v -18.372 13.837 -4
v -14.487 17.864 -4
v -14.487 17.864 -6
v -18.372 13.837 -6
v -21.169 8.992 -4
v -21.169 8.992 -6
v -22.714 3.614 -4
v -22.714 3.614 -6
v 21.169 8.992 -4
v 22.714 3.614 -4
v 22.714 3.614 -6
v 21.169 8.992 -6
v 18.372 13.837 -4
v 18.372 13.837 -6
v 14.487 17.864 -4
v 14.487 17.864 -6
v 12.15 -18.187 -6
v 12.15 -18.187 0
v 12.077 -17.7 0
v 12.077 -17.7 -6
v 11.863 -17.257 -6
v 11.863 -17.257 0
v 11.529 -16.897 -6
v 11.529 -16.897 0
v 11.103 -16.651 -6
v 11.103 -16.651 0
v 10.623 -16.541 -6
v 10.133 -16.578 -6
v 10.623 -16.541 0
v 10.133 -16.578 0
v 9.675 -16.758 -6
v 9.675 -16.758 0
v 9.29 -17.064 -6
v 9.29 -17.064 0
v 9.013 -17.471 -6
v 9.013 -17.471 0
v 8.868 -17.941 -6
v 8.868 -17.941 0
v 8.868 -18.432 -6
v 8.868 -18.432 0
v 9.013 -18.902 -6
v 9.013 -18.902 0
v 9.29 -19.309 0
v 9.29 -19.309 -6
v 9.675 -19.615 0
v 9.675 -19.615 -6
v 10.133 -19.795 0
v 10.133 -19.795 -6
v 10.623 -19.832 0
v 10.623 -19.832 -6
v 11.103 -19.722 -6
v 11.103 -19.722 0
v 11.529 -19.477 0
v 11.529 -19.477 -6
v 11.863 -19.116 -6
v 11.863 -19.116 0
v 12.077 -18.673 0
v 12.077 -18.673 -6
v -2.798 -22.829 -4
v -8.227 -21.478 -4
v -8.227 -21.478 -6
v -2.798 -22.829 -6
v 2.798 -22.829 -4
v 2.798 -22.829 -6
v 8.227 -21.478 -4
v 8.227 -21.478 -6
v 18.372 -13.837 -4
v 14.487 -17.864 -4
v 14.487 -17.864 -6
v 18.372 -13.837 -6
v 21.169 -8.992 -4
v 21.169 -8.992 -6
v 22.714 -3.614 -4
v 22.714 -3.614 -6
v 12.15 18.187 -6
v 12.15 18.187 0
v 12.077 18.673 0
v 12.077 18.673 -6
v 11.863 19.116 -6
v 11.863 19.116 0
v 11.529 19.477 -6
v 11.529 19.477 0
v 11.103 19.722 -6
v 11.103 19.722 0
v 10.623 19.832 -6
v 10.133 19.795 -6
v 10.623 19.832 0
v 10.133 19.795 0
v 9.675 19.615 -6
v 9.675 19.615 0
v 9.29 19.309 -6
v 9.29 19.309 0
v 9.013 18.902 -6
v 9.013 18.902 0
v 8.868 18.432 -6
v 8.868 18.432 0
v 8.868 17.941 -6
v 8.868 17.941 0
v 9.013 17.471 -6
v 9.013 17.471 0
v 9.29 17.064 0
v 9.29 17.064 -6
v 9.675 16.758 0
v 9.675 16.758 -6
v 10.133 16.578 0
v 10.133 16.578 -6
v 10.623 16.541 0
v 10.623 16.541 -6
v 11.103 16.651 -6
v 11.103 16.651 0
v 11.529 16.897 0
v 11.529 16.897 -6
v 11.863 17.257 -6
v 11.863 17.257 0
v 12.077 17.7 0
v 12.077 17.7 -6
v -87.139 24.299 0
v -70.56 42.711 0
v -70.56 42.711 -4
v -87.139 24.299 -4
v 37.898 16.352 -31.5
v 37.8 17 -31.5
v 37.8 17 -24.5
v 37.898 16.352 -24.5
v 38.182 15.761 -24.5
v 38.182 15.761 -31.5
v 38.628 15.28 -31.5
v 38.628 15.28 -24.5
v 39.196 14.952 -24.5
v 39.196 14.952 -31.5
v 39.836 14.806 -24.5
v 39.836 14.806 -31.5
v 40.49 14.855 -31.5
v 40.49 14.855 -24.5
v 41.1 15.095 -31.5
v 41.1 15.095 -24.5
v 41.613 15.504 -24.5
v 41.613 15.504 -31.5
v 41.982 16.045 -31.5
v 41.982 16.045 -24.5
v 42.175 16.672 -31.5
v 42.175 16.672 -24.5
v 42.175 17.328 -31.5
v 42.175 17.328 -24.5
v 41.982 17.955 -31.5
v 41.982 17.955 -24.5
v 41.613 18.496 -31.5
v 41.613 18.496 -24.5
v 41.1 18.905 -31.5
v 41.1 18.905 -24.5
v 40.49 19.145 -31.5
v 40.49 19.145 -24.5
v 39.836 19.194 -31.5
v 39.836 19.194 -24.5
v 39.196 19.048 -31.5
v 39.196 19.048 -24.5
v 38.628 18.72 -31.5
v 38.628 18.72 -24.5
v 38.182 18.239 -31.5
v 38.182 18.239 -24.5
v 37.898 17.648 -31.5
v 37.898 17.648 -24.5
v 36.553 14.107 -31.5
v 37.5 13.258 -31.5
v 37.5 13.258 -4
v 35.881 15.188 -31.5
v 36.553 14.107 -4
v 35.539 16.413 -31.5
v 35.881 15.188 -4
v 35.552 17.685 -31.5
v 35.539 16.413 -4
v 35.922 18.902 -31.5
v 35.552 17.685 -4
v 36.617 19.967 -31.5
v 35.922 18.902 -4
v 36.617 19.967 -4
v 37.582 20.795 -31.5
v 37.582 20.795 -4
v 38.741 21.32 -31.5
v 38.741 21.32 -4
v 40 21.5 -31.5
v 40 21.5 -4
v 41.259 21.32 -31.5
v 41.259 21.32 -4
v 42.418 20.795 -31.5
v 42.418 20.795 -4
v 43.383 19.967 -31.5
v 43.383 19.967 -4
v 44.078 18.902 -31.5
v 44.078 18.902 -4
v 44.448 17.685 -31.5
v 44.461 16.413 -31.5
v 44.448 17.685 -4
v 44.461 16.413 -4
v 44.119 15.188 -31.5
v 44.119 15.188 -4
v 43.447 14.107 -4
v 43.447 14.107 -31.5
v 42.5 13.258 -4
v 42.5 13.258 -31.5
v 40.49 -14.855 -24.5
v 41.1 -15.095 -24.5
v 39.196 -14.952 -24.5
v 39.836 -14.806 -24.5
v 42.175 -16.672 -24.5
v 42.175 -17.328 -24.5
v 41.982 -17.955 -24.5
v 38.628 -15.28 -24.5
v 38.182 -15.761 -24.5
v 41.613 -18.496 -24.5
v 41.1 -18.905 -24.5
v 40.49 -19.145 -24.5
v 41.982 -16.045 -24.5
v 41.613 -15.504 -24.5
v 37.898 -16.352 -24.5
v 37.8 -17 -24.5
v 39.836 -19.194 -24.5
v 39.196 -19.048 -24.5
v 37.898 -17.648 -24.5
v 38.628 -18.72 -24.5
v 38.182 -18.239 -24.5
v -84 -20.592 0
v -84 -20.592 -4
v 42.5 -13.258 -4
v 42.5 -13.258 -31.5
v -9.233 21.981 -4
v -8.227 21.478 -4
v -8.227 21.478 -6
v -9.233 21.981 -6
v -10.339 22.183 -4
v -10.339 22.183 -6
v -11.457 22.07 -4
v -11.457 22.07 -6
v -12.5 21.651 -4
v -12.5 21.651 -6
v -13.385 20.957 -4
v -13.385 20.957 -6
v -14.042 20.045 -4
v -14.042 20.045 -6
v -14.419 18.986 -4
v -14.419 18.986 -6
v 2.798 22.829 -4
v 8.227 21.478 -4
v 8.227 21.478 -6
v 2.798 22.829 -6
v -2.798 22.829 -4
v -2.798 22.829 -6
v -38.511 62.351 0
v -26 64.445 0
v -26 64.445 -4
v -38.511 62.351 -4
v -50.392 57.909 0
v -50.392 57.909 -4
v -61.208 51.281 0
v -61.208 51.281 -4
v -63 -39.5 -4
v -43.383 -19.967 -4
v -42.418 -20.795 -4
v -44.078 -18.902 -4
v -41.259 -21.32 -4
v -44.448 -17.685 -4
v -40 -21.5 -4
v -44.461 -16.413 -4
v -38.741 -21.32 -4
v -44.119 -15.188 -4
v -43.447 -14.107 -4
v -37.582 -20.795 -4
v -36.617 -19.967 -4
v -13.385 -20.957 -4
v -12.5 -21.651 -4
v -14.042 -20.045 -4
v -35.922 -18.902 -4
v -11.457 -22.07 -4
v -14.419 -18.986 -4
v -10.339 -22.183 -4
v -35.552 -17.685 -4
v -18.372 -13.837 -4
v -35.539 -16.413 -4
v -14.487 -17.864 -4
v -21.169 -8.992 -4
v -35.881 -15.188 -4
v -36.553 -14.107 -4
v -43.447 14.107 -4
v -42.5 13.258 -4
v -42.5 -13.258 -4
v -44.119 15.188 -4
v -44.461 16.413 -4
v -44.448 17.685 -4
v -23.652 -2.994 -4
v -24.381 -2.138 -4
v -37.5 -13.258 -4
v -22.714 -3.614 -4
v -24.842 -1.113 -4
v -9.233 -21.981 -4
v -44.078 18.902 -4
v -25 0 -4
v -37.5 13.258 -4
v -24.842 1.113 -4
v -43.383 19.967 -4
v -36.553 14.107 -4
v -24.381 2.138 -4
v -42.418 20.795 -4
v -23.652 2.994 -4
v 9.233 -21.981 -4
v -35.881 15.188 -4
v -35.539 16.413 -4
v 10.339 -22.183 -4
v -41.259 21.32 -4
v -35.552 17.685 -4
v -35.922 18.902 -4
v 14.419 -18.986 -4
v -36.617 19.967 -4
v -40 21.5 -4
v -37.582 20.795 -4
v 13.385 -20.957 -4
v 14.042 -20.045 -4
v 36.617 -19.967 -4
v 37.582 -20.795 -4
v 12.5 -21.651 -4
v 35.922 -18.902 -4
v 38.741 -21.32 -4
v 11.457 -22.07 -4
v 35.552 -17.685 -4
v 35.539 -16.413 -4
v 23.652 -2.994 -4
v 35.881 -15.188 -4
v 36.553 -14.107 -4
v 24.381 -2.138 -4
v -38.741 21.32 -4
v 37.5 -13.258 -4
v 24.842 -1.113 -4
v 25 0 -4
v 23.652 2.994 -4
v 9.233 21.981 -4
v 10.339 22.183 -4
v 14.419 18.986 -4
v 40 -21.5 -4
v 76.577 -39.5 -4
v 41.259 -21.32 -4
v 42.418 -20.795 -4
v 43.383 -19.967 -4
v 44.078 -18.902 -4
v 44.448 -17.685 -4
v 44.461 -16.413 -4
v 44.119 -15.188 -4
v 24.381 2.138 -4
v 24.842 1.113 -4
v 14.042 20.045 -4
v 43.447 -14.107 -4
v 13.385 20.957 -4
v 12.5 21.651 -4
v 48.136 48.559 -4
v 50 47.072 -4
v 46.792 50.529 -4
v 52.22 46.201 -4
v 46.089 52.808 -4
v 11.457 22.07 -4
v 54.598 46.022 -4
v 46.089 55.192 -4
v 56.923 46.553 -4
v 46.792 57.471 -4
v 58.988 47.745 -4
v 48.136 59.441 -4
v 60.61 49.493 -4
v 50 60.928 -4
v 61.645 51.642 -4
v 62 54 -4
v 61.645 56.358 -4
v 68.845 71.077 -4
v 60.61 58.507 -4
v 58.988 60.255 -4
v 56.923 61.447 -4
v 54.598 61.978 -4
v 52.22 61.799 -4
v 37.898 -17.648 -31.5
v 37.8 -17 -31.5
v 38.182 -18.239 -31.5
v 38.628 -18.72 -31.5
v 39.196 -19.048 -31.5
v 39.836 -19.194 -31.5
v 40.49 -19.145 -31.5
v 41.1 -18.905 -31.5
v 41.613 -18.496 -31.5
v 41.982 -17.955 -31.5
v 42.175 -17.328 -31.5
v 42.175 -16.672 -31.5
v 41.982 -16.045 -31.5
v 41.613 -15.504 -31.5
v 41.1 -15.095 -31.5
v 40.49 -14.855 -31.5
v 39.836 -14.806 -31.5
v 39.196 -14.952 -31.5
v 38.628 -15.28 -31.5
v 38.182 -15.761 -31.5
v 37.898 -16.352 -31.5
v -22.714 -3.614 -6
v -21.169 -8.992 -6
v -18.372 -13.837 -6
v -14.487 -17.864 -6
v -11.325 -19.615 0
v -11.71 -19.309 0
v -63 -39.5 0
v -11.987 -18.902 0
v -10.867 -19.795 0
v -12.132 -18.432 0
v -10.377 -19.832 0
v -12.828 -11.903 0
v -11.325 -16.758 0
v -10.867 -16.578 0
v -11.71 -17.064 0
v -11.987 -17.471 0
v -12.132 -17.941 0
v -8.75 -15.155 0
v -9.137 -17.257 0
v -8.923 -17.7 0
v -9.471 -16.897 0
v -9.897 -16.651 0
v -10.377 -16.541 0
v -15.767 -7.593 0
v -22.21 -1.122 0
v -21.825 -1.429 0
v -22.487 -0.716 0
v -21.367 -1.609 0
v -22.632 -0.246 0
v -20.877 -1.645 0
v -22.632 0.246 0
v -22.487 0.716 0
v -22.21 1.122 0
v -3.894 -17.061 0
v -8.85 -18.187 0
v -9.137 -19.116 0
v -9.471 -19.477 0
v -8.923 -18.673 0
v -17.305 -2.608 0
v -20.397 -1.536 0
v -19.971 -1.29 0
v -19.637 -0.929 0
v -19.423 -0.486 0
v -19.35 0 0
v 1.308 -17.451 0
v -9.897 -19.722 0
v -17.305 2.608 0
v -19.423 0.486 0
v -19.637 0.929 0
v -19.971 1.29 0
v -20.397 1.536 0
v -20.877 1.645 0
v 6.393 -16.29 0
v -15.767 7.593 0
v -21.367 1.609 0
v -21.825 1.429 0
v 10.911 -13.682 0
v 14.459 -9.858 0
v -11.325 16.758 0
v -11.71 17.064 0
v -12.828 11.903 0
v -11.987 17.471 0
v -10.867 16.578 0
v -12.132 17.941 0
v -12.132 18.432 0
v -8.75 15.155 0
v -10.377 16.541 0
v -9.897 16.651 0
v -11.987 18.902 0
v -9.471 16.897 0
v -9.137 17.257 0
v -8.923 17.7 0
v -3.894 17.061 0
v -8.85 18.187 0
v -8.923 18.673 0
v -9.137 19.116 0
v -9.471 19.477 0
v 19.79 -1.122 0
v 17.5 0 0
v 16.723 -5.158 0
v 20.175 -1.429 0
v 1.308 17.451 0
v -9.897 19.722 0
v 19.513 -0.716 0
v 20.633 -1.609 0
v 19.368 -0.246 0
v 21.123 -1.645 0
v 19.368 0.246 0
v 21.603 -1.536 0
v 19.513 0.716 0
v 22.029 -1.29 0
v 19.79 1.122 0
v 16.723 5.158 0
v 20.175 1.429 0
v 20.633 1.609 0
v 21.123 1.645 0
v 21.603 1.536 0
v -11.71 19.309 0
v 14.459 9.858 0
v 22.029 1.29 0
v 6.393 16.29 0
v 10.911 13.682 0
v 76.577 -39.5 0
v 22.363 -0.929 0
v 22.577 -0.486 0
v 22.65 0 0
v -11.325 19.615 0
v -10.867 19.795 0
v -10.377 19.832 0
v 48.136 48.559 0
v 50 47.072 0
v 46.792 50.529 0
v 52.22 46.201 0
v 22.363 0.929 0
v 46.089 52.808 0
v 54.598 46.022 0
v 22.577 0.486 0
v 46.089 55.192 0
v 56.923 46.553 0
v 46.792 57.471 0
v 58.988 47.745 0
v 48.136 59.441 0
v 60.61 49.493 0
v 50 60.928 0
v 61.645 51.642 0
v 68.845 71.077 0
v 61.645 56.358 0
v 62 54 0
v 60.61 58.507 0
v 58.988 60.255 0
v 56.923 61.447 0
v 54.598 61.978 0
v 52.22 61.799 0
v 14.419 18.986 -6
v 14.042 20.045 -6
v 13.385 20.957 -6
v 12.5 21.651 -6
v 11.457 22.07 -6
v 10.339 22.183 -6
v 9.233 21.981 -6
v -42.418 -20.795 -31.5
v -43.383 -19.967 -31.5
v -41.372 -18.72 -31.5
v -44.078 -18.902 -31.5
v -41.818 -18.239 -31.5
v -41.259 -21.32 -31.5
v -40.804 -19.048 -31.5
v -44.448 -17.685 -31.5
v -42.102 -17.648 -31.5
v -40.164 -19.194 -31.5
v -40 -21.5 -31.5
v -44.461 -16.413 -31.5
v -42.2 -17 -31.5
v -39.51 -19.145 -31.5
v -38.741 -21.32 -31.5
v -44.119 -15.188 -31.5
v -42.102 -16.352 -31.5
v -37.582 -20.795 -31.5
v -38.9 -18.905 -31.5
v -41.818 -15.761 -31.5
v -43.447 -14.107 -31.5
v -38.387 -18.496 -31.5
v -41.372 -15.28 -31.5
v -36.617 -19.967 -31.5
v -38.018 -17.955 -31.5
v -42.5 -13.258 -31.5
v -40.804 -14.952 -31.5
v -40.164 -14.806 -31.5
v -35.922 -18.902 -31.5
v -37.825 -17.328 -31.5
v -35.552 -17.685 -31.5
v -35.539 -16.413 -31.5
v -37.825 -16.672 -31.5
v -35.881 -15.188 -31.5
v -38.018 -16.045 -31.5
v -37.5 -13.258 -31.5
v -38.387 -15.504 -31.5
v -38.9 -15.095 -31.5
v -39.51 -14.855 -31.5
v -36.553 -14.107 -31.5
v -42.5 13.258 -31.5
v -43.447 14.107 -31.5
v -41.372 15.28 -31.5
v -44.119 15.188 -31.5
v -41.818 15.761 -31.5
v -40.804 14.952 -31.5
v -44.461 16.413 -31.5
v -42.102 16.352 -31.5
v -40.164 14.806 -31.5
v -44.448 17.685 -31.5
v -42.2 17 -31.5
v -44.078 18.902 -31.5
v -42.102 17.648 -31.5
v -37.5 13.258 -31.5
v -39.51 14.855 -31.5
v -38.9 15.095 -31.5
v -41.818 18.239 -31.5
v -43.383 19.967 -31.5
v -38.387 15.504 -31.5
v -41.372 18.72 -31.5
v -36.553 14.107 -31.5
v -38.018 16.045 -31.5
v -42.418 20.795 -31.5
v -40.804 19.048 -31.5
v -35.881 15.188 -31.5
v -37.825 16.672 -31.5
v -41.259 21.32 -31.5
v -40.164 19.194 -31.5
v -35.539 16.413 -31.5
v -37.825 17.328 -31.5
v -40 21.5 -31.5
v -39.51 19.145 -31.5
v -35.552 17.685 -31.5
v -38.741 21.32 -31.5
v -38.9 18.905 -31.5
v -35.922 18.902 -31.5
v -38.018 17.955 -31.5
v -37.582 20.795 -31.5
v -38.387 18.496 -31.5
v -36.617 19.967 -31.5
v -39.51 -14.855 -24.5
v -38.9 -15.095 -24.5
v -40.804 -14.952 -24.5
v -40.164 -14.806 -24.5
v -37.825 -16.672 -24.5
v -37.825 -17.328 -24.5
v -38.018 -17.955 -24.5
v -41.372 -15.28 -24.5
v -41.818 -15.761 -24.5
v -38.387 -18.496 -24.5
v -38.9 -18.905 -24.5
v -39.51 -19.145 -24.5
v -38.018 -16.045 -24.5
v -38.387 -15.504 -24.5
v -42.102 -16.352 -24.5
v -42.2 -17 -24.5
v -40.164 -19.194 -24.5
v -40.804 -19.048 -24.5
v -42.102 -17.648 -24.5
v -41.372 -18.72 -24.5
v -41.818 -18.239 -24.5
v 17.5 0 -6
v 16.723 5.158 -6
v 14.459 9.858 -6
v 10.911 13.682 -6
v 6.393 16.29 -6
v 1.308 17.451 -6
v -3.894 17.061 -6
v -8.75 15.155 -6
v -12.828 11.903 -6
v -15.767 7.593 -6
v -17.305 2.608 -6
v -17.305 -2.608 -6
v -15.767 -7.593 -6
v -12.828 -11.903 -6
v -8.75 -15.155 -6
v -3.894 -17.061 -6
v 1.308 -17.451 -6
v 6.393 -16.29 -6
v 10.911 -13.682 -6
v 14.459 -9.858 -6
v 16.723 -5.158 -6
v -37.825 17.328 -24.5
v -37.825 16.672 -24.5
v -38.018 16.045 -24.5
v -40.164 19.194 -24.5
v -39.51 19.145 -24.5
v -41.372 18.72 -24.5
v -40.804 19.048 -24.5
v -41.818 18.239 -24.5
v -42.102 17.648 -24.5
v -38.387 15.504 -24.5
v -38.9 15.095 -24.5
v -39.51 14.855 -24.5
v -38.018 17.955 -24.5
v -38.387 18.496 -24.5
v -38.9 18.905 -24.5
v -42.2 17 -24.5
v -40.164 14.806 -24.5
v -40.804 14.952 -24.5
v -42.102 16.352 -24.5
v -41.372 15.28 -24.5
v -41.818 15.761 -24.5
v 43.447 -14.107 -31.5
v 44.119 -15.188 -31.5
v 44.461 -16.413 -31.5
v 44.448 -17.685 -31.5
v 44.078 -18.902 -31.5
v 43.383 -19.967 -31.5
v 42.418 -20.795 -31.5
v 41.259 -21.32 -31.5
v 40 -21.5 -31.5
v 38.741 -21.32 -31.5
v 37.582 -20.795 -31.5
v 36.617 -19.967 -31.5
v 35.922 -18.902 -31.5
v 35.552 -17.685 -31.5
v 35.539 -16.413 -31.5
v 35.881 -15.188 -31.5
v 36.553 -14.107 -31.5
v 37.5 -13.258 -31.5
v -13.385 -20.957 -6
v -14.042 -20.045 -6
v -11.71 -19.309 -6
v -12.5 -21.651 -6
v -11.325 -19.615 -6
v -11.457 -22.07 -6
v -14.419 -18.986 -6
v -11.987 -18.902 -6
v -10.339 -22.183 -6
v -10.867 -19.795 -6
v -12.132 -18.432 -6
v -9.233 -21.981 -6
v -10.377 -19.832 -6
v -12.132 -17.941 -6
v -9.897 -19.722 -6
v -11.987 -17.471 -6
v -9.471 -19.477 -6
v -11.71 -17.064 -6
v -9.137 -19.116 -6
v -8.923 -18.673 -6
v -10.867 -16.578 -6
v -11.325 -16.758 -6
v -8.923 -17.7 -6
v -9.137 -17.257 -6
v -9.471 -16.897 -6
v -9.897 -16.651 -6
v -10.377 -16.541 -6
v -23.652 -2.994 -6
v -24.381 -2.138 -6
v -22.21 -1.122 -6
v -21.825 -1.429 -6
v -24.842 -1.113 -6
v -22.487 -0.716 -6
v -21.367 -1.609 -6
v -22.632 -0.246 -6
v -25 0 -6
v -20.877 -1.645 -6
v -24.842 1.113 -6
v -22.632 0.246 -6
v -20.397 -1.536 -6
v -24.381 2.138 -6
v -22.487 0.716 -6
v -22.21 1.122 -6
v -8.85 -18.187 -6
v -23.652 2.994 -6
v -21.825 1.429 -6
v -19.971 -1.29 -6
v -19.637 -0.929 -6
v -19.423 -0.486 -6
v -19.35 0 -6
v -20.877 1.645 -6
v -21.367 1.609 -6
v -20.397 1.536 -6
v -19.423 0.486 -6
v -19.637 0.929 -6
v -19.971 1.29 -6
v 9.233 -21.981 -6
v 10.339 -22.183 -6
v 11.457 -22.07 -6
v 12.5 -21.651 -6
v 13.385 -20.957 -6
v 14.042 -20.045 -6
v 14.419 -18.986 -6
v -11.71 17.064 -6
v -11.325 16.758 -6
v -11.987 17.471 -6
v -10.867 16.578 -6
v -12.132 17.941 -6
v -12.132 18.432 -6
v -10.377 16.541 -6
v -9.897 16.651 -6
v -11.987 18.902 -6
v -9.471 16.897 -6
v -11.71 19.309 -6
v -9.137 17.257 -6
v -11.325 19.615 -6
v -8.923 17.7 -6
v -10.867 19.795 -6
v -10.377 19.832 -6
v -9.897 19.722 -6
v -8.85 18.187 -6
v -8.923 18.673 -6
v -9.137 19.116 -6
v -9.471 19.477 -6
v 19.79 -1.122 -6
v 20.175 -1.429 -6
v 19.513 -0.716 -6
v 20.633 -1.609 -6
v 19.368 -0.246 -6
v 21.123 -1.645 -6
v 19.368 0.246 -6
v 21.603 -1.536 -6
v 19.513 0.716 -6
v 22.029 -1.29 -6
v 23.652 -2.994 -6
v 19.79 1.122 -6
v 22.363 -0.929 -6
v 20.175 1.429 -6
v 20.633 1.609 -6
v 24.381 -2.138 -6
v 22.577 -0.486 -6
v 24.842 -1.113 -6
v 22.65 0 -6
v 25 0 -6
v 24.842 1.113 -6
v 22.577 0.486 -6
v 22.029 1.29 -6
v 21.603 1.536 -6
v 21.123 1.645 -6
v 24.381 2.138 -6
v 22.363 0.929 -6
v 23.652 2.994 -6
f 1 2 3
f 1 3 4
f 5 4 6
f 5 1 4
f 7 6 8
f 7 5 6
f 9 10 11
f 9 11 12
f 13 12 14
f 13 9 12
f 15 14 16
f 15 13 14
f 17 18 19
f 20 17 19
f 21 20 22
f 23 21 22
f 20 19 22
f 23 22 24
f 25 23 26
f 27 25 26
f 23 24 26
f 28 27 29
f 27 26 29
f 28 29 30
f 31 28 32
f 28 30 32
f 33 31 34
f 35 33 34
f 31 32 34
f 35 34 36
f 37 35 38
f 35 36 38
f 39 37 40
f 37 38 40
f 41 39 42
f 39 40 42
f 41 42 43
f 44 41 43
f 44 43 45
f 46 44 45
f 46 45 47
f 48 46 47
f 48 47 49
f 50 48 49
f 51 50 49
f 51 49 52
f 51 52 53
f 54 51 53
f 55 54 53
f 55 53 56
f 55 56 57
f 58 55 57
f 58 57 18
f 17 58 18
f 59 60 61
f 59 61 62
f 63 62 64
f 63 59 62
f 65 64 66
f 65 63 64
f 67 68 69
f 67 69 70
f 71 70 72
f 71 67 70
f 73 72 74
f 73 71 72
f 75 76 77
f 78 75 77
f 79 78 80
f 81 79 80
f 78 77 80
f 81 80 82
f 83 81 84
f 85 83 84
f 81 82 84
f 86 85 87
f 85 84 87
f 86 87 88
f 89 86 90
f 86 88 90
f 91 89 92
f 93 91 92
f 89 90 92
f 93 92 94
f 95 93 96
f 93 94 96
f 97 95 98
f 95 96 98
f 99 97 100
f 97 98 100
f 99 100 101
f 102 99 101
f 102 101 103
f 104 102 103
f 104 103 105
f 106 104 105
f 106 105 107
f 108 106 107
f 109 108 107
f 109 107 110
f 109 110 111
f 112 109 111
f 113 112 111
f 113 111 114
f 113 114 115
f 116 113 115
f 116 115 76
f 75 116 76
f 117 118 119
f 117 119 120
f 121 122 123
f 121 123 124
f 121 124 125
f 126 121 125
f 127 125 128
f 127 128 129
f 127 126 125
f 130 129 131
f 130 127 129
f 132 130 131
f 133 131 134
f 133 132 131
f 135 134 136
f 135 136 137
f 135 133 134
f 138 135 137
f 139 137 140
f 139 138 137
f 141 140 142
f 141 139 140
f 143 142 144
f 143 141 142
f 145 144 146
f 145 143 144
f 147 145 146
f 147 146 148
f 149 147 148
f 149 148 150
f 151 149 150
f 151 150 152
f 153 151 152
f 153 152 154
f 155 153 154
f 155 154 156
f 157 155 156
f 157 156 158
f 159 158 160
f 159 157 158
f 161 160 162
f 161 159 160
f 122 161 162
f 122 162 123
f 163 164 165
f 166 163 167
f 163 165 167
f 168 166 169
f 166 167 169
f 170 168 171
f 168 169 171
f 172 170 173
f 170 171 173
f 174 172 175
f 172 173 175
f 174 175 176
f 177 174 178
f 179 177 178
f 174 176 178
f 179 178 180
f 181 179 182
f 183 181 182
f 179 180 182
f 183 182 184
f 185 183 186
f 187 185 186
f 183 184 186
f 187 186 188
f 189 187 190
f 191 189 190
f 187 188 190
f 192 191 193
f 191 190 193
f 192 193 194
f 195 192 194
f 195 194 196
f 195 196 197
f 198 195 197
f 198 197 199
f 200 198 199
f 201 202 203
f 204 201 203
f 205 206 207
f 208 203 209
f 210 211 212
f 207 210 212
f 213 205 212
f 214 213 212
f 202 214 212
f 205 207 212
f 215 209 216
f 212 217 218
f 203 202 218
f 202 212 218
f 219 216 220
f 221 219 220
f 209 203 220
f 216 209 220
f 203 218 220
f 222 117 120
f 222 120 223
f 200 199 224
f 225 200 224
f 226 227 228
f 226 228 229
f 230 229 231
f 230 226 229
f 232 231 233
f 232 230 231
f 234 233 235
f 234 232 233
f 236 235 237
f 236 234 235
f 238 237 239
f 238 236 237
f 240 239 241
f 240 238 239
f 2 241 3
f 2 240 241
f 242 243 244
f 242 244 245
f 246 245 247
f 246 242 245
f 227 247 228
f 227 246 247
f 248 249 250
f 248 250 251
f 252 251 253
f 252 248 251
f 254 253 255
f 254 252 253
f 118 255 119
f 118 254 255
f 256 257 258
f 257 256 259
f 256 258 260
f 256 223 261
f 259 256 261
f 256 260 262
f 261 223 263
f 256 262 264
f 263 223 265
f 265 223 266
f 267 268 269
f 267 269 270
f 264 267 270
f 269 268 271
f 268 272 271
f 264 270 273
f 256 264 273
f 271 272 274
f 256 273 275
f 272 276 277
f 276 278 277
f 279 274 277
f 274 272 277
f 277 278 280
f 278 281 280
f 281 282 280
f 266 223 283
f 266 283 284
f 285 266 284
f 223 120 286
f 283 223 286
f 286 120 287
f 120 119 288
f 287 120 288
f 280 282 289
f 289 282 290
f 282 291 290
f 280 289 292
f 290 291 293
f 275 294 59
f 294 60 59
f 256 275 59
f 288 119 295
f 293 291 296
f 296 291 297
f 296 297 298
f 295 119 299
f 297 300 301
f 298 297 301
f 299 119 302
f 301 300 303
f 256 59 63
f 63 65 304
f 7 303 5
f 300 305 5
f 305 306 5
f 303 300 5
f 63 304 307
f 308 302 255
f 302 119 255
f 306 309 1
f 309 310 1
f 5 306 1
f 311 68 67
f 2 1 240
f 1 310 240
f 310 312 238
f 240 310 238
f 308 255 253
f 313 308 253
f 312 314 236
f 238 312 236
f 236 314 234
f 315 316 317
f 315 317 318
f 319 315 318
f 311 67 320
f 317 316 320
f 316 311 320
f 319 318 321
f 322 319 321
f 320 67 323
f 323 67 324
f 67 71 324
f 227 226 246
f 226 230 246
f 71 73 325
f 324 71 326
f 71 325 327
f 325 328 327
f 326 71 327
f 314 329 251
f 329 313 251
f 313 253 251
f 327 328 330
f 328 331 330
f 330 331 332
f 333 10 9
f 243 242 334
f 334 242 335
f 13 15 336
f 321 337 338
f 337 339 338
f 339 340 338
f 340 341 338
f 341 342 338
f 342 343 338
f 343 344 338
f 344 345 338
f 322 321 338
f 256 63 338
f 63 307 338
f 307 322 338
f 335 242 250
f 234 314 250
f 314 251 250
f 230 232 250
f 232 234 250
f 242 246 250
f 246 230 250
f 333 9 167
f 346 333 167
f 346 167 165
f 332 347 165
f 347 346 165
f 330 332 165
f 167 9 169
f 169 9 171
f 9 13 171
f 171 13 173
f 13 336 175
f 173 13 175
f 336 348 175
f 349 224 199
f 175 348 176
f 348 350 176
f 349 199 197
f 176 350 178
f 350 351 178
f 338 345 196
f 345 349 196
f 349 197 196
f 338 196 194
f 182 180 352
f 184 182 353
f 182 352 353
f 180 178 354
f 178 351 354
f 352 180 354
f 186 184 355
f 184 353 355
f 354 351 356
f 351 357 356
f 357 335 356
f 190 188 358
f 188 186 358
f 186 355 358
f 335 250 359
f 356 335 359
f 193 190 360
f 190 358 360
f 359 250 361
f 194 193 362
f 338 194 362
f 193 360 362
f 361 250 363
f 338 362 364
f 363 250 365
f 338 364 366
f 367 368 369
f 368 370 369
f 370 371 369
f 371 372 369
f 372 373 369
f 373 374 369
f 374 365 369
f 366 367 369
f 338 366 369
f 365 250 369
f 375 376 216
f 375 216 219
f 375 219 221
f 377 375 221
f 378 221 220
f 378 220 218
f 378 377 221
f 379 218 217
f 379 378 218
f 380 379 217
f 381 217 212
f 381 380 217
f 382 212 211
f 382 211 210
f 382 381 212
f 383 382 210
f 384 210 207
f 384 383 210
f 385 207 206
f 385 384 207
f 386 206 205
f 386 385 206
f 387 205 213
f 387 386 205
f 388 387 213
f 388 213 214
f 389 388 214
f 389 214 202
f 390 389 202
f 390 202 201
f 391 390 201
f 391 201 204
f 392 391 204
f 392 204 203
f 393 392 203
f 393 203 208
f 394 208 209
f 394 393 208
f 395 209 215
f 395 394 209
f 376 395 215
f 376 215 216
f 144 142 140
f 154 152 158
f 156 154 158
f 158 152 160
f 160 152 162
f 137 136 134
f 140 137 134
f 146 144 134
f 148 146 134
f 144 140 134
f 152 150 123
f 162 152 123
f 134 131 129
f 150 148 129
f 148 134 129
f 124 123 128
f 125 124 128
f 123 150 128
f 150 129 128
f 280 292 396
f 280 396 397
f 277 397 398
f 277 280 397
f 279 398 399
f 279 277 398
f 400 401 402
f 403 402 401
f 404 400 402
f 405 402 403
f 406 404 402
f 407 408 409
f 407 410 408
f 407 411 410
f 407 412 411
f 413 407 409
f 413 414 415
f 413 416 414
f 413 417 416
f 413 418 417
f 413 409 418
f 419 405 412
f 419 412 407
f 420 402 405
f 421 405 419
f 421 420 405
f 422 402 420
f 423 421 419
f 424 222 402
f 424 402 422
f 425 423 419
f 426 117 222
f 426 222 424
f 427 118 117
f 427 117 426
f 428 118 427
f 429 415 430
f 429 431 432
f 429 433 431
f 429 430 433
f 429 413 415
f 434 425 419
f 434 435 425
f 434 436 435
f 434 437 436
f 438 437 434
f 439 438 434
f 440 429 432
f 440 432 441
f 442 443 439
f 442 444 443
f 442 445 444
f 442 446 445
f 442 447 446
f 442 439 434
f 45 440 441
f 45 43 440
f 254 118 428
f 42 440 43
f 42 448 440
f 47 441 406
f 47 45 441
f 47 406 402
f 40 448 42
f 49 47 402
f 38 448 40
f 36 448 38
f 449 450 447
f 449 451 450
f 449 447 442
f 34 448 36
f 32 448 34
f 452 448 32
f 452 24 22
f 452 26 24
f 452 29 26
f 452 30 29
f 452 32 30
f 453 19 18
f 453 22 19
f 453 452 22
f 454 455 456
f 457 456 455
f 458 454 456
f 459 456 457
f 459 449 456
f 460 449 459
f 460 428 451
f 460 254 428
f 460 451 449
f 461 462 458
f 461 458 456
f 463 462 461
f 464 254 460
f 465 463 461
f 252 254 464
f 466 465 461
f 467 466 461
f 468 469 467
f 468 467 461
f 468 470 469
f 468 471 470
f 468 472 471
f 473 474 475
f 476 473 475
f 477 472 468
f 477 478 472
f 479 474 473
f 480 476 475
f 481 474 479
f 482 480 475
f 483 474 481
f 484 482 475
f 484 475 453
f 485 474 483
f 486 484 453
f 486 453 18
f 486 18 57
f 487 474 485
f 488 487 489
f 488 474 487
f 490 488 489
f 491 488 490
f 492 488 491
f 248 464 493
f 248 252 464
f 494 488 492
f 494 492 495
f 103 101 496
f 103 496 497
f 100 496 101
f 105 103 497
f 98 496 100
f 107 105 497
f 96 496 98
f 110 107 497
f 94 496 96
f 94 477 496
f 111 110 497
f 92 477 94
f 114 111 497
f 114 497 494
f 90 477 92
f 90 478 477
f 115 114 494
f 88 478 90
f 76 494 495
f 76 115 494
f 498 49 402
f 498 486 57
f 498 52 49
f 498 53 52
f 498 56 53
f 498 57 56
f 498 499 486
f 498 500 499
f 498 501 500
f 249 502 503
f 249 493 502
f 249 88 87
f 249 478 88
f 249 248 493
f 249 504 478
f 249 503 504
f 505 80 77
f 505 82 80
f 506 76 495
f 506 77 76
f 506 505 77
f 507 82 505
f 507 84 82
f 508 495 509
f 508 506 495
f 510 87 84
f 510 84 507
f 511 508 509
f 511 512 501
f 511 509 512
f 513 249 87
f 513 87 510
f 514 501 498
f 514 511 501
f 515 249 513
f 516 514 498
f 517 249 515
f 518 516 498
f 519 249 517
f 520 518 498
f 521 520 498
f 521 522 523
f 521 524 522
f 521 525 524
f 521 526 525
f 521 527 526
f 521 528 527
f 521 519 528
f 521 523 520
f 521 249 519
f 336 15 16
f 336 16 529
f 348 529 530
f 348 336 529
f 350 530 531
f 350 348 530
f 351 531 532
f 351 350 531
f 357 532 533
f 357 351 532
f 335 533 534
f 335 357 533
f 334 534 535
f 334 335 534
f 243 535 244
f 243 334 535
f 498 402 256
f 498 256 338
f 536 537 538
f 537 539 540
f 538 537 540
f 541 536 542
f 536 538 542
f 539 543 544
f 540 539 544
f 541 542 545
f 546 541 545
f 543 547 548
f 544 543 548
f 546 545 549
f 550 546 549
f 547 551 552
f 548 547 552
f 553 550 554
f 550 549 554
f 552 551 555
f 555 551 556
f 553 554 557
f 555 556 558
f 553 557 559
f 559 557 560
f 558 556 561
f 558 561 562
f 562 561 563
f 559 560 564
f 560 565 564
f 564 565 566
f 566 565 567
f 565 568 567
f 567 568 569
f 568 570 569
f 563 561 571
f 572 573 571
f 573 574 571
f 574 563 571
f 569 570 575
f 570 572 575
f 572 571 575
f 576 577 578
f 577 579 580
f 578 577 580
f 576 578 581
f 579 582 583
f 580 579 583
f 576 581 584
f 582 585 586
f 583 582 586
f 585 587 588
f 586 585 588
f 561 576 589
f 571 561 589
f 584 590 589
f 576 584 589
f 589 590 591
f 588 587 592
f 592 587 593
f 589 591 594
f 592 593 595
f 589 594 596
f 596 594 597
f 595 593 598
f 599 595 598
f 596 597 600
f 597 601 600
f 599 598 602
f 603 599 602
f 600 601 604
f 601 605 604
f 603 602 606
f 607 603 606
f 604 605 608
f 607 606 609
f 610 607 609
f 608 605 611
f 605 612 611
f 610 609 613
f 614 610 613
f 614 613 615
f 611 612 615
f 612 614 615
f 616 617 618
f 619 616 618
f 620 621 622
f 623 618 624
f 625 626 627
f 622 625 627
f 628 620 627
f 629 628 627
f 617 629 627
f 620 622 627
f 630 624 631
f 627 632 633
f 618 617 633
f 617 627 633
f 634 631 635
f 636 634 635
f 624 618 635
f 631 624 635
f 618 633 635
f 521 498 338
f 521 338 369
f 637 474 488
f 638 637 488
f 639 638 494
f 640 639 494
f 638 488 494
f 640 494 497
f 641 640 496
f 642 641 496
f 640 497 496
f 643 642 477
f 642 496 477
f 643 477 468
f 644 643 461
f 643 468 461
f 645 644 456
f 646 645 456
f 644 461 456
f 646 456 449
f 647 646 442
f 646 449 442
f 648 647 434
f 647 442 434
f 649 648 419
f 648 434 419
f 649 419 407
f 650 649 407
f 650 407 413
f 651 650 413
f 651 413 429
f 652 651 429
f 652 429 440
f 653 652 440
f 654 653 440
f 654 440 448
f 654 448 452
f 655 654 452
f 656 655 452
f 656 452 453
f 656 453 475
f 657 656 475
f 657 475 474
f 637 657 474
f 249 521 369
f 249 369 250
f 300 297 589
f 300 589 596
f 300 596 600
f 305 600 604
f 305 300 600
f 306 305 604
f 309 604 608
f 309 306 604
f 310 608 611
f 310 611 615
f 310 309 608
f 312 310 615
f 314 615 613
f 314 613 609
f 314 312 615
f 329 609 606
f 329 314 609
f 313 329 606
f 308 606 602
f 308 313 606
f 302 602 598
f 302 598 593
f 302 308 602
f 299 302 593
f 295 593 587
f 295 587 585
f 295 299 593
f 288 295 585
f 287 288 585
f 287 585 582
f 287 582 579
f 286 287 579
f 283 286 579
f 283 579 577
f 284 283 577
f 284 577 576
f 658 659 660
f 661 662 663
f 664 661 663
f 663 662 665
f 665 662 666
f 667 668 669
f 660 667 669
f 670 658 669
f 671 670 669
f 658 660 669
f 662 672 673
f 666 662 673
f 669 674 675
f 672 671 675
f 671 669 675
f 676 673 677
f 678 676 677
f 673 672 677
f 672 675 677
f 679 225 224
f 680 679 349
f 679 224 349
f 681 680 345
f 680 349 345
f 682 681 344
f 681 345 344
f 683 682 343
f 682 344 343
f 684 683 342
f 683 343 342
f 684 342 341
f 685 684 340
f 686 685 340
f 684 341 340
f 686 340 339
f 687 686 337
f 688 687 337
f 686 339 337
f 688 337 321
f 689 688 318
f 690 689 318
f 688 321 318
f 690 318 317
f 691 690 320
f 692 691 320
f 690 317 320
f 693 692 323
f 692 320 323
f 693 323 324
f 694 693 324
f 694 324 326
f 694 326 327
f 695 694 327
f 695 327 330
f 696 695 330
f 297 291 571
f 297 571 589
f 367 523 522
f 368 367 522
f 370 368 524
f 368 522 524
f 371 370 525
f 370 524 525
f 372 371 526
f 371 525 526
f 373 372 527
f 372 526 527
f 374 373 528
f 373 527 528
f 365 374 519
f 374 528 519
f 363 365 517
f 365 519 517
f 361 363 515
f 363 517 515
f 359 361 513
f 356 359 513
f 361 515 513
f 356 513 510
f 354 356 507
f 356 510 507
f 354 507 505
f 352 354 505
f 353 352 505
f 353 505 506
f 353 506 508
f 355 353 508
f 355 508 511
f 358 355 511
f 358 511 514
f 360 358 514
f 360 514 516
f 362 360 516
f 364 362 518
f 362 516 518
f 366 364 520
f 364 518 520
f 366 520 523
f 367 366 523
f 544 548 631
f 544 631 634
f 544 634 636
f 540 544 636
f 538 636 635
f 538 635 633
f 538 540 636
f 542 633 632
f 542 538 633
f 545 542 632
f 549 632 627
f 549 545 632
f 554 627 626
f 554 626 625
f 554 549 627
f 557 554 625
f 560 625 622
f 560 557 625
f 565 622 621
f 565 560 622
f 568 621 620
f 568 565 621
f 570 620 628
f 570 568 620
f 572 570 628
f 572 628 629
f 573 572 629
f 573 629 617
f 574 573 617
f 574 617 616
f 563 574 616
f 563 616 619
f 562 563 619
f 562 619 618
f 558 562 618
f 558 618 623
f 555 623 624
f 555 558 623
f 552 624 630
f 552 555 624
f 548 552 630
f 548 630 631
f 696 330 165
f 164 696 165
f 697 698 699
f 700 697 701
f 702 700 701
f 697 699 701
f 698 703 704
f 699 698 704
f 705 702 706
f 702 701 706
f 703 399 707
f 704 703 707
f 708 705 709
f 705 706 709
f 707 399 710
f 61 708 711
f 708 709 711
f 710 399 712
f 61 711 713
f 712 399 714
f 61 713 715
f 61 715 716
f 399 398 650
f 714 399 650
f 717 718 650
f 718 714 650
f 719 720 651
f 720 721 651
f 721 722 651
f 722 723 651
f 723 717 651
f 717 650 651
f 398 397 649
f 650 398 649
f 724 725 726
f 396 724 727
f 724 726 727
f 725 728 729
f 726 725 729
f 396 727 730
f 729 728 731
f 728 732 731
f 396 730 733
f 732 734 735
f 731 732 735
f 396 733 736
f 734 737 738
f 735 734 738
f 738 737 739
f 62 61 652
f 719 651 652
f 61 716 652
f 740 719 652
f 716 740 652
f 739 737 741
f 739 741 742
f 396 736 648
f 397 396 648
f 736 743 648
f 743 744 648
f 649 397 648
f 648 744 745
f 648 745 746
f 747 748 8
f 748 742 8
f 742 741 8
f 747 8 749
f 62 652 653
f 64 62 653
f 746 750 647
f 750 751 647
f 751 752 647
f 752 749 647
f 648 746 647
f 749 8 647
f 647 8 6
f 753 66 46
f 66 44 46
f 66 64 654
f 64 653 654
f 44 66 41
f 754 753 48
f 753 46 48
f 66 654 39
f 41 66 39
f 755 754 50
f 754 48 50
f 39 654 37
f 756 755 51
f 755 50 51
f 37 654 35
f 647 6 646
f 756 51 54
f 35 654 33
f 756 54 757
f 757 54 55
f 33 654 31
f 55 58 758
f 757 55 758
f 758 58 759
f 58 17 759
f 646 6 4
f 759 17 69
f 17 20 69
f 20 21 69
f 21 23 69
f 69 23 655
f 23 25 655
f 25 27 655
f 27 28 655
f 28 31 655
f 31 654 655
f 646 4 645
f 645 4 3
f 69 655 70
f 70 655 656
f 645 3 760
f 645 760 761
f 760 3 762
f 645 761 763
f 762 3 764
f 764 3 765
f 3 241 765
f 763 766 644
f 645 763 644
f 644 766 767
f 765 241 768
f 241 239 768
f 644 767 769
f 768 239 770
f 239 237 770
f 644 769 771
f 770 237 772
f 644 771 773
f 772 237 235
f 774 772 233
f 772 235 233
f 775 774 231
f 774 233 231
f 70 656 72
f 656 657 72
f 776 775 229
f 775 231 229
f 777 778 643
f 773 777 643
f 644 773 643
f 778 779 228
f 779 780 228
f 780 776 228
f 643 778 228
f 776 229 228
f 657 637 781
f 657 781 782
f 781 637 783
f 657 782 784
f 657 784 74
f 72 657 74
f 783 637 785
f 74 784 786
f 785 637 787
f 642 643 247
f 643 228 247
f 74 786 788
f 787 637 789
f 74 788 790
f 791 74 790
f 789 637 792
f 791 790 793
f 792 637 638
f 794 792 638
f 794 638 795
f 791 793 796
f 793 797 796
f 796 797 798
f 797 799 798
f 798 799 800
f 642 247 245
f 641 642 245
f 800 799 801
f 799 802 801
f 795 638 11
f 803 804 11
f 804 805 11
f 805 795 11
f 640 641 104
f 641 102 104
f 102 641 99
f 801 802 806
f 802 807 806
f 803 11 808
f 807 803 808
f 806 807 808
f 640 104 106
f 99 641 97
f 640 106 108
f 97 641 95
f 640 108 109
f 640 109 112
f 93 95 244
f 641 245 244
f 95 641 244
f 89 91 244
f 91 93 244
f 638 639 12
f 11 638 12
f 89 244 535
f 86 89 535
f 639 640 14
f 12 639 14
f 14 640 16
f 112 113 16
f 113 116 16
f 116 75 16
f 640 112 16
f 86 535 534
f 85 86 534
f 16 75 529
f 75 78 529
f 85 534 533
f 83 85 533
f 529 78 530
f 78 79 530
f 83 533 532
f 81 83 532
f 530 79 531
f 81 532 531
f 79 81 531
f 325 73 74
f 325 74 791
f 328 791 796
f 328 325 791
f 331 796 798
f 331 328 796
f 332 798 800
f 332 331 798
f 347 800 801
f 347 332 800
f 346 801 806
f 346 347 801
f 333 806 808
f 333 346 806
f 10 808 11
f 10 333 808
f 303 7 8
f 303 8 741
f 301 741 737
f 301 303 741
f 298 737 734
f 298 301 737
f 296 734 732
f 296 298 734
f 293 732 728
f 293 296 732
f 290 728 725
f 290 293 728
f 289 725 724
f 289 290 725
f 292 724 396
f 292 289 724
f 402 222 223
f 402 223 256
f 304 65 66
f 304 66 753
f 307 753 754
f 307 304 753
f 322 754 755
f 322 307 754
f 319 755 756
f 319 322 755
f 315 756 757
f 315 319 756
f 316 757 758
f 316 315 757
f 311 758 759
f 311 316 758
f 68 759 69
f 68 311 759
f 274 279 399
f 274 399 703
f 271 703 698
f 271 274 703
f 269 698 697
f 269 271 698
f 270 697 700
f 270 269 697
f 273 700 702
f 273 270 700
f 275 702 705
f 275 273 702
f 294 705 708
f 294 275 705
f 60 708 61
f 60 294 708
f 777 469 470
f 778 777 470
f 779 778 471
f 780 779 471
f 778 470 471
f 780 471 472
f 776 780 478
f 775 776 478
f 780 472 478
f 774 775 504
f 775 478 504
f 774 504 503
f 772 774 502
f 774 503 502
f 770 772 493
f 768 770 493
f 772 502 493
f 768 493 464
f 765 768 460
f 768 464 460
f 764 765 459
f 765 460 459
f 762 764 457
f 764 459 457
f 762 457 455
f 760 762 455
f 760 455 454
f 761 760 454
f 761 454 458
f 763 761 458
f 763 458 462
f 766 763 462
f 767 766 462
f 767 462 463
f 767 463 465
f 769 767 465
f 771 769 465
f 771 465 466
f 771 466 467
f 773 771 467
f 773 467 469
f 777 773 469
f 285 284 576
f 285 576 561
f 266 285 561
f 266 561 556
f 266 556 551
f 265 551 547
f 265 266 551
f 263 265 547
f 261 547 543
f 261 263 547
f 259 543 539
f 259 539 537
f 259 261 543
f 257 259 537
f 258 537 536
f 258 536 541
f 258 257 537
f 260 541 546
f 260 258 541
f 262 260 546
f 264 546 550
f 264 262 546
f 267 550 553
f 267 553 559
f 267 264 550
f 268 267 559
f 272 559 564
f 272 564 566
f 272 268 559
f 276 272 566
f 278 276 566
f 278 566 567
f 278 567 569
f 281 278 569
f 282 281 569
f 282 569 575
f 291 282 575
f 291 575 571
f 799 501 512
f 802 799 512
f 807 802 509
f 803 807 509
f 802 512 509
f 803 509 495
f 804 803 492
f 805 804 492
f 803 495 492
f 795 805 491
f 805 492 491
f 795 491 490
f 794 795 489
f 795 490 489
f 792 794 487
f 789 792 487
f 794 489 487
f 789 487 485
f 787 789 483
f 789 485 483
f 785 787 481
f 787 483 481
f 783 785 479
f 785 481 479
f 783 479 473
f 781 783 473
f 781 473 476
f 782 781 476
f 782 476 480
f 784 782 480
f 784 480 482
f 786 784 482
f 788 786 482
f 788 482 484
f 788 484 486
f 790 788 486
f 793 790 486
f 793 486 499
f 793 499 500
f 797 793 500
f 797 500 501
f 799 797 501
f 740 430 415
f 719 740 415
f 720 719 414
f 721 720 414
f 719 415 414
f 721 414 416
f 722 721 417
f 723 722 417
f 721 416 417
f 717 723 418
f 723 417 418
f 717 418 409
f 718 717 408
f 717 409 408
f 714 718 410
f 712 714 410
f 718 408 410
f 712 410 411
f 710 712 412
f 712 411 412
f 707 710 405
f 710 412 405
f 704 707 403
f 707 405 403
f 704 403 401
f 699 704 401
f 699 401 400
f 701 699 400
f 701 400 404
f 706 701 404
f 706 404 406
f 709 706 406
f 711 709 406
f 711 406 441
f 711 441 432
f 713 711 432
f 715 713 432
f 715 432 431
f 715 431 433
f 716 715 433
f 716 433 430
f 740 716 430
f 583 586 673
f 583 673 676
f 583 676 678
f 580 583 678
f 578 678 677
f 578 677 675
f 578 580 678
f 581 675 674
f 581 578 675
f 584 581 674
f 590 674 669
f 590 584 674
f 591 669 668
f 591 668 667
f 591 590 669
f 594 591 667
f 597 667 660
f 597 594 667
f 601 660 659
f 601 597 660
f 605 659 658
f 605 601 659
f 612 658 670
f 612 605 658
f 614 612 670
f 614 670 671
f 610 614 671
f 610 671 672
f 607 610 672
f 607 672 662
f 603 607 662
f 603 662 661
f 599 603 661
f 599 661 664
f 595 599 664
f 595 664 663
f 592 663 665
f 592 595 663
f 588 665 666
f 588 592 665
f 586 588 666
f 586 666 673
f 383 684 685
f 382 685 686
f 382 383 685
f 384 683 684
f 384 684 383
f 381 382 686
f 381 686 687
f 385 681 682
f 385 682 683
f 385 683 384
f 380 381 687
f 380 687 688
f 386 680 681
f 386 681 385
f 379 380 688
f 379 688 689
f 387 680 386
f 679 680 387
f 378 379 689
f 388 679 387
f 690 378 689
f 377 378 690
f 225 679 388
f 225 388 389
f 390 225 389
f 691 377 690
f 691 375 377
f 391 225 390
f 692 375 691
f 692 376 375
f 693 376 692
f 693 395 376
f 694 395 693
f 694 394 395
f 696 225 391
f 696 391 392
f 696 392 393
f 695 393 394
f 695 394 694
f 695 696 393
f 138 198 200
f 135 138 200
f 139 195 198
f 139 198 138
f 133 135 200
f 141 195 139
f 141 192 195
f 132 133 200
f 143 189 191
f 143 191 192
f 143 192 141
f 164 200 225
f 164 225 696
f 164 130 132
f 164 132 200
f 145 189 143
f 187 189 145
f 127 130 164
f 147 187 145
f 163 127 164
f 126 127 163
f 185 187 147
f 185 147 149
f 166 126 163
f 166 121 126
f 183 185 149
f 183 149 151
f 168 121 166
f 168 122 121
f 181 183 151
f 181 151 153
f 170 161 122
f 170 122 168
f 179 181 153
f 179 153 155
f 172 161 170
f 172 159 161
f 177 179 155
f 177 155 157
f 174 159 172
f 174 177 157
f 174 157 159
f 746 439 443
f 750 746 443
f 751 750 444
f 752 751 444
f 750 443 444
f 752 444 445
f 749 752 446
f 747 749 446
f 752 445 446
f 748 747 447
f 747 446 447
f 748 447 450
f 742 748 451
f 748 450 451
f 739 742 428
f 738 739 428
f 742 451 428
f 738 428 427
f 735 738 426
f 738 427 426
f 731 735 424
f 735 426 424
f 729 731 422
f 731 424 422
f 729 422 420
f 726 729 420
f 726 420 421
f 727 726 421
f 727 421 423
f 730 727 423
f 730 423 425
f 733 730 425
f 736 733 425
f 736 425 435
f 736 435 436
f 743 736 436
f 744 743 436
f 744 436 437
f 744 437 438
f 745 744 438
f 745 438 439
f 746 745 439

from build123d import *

# Parameters (mm, degrees)
SKETCH2_R           = 8
SKETCH2_R_2         = 17.5
BOSS_EXTRUDE2_DEPTH = 4
SKETCH2_3_R         = 17.5
BOSS_EXTRUDE3_DEPTH = 6
SKETCH2_6_R         = 1.65
CUT_EXTRUDE1_DEPTH  = 113.610704204
BOSS_EXTRUDE4_DEPTH = 31.5
CUT_EXTRUDE2_START  = -31.5
SKETCH2_8_R         = 2.2
CUT_EXTRUDE2_DEPTH  = 7


with BuildPart() as part:
    # Sketch2 → Boss-Extrude2 (new body)
    with BuildSketch(Plane.XY):
        with BuildLine():
            Line((-87.139041318, 24.298867192), (-84, -20.59151507))
            Line((-84, -20.59151507), (-63, -39.5))
            Line((-63, -39.5), (76.577227286, -39.5))
            Line((76.577227286, -39.5), (68.844921224, 71.077128384))
            Line((68.844921224, 71.077128384), (-26, 64.444925414))
            ThreePointArc((-26, 64.444925414), (-50.392441883, 57.90899031), (-70.560315786, 42.711407248))
            Line((-70.560315786, 42.711407248), (-87.139041318, 24.298867192))
        make_face()
        with Locations((54, 54)):
            Circle(SKETCH2_R, mode=Mode.SUBTRACT)
        Circle(SKETCH2_R_2, mode=Mode.SUBTRACT)
    extrude(amount=-BOSS_EXTRUDE2_DEPTH)

    # Sketch2<3> → Boss-Extrude3 (add)
    with BuildSketch(Plane.XY):
        with BuildLine():
            ThreePointArc((-14.486986043, 17.864132652), (-19.918584287, 11.5), (-22.714285714, 3.614031612))
            ThreePointArc((-22.714285714, 3.614031612), (-25, 0), (-22.714285714, -3.614031612))
            ThreePointArc((-22.714285714, -3.614031612), (-19.918584287, -11.5), (-14.486986043, -17.864132652))
            ThreePointArc((-14.486986043, -17.864132652), (-12.5, -21.650635095), (-8.227299671, -21.478164263))
            ThreePointArc((-8.227299671, -21.478164263), (0, -23), (8.227299671, -21.478164263))
            ThreePointArc((8.227299671, -21.478164263), (12.5, -21.650635095), (14.486986043, -17.864132652))
            ThreePointArc((14.486986043, -17.864132652), (19.918584287, -11.5), (22.714285714, -3.614031612))
            ThreePointArc((22.714285714, -3.614031612), (25, 0), (22.714285714, 3.614031612))
            ThreePointArc((22.714285714, 3.614031612), (19.918584287, 11.5), (14.486986043, 17.864132652))
            ThreePointArc((14.486986043, 17.864132652), (12.5, 21.650635095), (8.227299671, 21.478164263))
            ThreePointArc((8.227299671, 21.478164263), (0, 23), (-8.227299671, 21.478164263))
            ThreePointArc((-8.227299671, 21.478164263), (-12.5, 21.650635095), (-14.486986043, 17.864132652))
        make_face()
        Circle(SKETCH2_3_R, mode=Mode.SUBTRACT)
    extrude(amount=-BOSS_EXTRUDE3_DEPTH)

    # Sketch2<6> → Cut-Extrude1 (cut, through all)
    with BuildSketch(Plane.XY):
        with Locations((-10.5, 18.186533479)):
            Circle(SKETCH2_6_R)
        with Locations((10.5, 18.186533479)):
            Circle(SKETCH2_6_R)
        with Locations((21, 0)):
            Circle(SKETCH2_6_R)
        with Locations((10.5, -18.186533479)):
            Circle(SKETCH2_6_R)
        with Locations((-10.5, -18.186533479)):
            Circle(SKETCH2_6_R)
        with Locations((-21, 0)):
            Circle(SKETCH2_6_R)
    extrude(amount=-CUT_EXTRUDE1_DEPTH, mode=Mode.SUBTRACT)

    # Sketch2<7> → Boss-Extrude4 (add)
    with BuildSketch(Plane.XY):
        with BuildLine():
            Line((-42.5, 13.258342613), (-42.5, -13.258342613))
            ThreePointArc((-42.5, -13.258342613), (-40, -21.5), (-37.5, -13.258342613))
            Line((-37.5, -13.258342613), (-37.5, 13.258342613))
            ThreePointArc((-37.5, 13.258342613), (-40, 21.5), (-42.5, 13.258342613))
        make_face()
        with BuildLine():
            Line((42.5, 13.258342613), (42.5, -13.258342613))
            ThreePointArc((42.5, -13.258342613), (40, -21.5), (37.5, -13.258342613))
            Line((37.5, -13.258342613), (37.5, 13.258342613))
            ThreePointArc((37.5, 13.258342613), (40, 21.5), (42.5, 13.258342613))
        make_face()
    extrude(amount=-BOSS_EXTRUDE4_DEPTH)

    # Sketch2<8> → Cut-Extrude2 (cut)
    with BuildSketch(Plane.XY.offset(CUT_EXTRUDE2_START)):
        with Locations(Location((-40, 17, 0), (0, 0, 180))):
            Circle(SKETCH2_8_R)
        with Locations(Location((-40, -17, 0), (0, 0, 180))):
            Circle(SKETCH2_8_R)
        with Locations(Location((40, 17, 0), (0, 0, 180))):
            Circle(SKETCH2_8_R)
        with Locations(Location((40, -17, 0), (0, 0, 180))):
            Circle(SKETCH2_8_R)
    extrude(amount=CUT_EXTRUDE2_DEPTH, mode=Mode.SUBTRACT)


solid = part.part
